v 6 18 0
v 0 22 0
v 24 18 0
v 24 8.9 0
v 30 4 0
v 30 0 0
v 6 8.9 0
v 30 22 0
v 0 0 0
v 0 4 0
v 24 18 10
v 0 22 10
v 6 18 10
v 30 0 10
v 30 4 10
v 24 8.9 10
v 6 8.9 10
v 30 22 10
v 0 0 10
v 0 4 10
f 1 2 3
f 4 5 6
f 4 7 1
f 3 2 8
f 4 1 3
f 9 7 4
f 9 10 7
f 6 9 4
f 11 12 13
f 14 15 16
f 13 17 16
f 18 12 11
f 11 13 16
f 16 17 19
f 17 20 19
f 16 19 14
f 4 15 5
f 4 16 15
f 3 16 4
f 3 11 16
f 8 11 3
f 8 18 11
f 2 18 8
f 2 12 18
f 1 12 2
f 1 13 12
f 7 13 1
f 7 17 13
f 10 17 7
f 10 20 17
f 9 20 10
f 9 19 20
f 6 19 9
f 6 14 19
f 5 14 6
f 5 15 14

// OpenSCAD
$fn = 32;

// ----------------------------------------------------------------------
// Key bar: dovetail key, 10 mm thick
// ----------------------------------------------------------------------

// --- parameters (mm) ---
profile_height = 10;      // extrusion height
profile_points = 10;      // points of the closed outline

profile = [[0, 0], [30, 0], [30, 4], [24, 8.9], [24, 18], [30, 22], [0, 22], [6, 18], [6, 8.9], [0, 4]];  // single closed polygon, 10 points, counter clockwise

// --- the one profile operation ---
linear_extrude(height = profile_height) polygon(points = profile);
